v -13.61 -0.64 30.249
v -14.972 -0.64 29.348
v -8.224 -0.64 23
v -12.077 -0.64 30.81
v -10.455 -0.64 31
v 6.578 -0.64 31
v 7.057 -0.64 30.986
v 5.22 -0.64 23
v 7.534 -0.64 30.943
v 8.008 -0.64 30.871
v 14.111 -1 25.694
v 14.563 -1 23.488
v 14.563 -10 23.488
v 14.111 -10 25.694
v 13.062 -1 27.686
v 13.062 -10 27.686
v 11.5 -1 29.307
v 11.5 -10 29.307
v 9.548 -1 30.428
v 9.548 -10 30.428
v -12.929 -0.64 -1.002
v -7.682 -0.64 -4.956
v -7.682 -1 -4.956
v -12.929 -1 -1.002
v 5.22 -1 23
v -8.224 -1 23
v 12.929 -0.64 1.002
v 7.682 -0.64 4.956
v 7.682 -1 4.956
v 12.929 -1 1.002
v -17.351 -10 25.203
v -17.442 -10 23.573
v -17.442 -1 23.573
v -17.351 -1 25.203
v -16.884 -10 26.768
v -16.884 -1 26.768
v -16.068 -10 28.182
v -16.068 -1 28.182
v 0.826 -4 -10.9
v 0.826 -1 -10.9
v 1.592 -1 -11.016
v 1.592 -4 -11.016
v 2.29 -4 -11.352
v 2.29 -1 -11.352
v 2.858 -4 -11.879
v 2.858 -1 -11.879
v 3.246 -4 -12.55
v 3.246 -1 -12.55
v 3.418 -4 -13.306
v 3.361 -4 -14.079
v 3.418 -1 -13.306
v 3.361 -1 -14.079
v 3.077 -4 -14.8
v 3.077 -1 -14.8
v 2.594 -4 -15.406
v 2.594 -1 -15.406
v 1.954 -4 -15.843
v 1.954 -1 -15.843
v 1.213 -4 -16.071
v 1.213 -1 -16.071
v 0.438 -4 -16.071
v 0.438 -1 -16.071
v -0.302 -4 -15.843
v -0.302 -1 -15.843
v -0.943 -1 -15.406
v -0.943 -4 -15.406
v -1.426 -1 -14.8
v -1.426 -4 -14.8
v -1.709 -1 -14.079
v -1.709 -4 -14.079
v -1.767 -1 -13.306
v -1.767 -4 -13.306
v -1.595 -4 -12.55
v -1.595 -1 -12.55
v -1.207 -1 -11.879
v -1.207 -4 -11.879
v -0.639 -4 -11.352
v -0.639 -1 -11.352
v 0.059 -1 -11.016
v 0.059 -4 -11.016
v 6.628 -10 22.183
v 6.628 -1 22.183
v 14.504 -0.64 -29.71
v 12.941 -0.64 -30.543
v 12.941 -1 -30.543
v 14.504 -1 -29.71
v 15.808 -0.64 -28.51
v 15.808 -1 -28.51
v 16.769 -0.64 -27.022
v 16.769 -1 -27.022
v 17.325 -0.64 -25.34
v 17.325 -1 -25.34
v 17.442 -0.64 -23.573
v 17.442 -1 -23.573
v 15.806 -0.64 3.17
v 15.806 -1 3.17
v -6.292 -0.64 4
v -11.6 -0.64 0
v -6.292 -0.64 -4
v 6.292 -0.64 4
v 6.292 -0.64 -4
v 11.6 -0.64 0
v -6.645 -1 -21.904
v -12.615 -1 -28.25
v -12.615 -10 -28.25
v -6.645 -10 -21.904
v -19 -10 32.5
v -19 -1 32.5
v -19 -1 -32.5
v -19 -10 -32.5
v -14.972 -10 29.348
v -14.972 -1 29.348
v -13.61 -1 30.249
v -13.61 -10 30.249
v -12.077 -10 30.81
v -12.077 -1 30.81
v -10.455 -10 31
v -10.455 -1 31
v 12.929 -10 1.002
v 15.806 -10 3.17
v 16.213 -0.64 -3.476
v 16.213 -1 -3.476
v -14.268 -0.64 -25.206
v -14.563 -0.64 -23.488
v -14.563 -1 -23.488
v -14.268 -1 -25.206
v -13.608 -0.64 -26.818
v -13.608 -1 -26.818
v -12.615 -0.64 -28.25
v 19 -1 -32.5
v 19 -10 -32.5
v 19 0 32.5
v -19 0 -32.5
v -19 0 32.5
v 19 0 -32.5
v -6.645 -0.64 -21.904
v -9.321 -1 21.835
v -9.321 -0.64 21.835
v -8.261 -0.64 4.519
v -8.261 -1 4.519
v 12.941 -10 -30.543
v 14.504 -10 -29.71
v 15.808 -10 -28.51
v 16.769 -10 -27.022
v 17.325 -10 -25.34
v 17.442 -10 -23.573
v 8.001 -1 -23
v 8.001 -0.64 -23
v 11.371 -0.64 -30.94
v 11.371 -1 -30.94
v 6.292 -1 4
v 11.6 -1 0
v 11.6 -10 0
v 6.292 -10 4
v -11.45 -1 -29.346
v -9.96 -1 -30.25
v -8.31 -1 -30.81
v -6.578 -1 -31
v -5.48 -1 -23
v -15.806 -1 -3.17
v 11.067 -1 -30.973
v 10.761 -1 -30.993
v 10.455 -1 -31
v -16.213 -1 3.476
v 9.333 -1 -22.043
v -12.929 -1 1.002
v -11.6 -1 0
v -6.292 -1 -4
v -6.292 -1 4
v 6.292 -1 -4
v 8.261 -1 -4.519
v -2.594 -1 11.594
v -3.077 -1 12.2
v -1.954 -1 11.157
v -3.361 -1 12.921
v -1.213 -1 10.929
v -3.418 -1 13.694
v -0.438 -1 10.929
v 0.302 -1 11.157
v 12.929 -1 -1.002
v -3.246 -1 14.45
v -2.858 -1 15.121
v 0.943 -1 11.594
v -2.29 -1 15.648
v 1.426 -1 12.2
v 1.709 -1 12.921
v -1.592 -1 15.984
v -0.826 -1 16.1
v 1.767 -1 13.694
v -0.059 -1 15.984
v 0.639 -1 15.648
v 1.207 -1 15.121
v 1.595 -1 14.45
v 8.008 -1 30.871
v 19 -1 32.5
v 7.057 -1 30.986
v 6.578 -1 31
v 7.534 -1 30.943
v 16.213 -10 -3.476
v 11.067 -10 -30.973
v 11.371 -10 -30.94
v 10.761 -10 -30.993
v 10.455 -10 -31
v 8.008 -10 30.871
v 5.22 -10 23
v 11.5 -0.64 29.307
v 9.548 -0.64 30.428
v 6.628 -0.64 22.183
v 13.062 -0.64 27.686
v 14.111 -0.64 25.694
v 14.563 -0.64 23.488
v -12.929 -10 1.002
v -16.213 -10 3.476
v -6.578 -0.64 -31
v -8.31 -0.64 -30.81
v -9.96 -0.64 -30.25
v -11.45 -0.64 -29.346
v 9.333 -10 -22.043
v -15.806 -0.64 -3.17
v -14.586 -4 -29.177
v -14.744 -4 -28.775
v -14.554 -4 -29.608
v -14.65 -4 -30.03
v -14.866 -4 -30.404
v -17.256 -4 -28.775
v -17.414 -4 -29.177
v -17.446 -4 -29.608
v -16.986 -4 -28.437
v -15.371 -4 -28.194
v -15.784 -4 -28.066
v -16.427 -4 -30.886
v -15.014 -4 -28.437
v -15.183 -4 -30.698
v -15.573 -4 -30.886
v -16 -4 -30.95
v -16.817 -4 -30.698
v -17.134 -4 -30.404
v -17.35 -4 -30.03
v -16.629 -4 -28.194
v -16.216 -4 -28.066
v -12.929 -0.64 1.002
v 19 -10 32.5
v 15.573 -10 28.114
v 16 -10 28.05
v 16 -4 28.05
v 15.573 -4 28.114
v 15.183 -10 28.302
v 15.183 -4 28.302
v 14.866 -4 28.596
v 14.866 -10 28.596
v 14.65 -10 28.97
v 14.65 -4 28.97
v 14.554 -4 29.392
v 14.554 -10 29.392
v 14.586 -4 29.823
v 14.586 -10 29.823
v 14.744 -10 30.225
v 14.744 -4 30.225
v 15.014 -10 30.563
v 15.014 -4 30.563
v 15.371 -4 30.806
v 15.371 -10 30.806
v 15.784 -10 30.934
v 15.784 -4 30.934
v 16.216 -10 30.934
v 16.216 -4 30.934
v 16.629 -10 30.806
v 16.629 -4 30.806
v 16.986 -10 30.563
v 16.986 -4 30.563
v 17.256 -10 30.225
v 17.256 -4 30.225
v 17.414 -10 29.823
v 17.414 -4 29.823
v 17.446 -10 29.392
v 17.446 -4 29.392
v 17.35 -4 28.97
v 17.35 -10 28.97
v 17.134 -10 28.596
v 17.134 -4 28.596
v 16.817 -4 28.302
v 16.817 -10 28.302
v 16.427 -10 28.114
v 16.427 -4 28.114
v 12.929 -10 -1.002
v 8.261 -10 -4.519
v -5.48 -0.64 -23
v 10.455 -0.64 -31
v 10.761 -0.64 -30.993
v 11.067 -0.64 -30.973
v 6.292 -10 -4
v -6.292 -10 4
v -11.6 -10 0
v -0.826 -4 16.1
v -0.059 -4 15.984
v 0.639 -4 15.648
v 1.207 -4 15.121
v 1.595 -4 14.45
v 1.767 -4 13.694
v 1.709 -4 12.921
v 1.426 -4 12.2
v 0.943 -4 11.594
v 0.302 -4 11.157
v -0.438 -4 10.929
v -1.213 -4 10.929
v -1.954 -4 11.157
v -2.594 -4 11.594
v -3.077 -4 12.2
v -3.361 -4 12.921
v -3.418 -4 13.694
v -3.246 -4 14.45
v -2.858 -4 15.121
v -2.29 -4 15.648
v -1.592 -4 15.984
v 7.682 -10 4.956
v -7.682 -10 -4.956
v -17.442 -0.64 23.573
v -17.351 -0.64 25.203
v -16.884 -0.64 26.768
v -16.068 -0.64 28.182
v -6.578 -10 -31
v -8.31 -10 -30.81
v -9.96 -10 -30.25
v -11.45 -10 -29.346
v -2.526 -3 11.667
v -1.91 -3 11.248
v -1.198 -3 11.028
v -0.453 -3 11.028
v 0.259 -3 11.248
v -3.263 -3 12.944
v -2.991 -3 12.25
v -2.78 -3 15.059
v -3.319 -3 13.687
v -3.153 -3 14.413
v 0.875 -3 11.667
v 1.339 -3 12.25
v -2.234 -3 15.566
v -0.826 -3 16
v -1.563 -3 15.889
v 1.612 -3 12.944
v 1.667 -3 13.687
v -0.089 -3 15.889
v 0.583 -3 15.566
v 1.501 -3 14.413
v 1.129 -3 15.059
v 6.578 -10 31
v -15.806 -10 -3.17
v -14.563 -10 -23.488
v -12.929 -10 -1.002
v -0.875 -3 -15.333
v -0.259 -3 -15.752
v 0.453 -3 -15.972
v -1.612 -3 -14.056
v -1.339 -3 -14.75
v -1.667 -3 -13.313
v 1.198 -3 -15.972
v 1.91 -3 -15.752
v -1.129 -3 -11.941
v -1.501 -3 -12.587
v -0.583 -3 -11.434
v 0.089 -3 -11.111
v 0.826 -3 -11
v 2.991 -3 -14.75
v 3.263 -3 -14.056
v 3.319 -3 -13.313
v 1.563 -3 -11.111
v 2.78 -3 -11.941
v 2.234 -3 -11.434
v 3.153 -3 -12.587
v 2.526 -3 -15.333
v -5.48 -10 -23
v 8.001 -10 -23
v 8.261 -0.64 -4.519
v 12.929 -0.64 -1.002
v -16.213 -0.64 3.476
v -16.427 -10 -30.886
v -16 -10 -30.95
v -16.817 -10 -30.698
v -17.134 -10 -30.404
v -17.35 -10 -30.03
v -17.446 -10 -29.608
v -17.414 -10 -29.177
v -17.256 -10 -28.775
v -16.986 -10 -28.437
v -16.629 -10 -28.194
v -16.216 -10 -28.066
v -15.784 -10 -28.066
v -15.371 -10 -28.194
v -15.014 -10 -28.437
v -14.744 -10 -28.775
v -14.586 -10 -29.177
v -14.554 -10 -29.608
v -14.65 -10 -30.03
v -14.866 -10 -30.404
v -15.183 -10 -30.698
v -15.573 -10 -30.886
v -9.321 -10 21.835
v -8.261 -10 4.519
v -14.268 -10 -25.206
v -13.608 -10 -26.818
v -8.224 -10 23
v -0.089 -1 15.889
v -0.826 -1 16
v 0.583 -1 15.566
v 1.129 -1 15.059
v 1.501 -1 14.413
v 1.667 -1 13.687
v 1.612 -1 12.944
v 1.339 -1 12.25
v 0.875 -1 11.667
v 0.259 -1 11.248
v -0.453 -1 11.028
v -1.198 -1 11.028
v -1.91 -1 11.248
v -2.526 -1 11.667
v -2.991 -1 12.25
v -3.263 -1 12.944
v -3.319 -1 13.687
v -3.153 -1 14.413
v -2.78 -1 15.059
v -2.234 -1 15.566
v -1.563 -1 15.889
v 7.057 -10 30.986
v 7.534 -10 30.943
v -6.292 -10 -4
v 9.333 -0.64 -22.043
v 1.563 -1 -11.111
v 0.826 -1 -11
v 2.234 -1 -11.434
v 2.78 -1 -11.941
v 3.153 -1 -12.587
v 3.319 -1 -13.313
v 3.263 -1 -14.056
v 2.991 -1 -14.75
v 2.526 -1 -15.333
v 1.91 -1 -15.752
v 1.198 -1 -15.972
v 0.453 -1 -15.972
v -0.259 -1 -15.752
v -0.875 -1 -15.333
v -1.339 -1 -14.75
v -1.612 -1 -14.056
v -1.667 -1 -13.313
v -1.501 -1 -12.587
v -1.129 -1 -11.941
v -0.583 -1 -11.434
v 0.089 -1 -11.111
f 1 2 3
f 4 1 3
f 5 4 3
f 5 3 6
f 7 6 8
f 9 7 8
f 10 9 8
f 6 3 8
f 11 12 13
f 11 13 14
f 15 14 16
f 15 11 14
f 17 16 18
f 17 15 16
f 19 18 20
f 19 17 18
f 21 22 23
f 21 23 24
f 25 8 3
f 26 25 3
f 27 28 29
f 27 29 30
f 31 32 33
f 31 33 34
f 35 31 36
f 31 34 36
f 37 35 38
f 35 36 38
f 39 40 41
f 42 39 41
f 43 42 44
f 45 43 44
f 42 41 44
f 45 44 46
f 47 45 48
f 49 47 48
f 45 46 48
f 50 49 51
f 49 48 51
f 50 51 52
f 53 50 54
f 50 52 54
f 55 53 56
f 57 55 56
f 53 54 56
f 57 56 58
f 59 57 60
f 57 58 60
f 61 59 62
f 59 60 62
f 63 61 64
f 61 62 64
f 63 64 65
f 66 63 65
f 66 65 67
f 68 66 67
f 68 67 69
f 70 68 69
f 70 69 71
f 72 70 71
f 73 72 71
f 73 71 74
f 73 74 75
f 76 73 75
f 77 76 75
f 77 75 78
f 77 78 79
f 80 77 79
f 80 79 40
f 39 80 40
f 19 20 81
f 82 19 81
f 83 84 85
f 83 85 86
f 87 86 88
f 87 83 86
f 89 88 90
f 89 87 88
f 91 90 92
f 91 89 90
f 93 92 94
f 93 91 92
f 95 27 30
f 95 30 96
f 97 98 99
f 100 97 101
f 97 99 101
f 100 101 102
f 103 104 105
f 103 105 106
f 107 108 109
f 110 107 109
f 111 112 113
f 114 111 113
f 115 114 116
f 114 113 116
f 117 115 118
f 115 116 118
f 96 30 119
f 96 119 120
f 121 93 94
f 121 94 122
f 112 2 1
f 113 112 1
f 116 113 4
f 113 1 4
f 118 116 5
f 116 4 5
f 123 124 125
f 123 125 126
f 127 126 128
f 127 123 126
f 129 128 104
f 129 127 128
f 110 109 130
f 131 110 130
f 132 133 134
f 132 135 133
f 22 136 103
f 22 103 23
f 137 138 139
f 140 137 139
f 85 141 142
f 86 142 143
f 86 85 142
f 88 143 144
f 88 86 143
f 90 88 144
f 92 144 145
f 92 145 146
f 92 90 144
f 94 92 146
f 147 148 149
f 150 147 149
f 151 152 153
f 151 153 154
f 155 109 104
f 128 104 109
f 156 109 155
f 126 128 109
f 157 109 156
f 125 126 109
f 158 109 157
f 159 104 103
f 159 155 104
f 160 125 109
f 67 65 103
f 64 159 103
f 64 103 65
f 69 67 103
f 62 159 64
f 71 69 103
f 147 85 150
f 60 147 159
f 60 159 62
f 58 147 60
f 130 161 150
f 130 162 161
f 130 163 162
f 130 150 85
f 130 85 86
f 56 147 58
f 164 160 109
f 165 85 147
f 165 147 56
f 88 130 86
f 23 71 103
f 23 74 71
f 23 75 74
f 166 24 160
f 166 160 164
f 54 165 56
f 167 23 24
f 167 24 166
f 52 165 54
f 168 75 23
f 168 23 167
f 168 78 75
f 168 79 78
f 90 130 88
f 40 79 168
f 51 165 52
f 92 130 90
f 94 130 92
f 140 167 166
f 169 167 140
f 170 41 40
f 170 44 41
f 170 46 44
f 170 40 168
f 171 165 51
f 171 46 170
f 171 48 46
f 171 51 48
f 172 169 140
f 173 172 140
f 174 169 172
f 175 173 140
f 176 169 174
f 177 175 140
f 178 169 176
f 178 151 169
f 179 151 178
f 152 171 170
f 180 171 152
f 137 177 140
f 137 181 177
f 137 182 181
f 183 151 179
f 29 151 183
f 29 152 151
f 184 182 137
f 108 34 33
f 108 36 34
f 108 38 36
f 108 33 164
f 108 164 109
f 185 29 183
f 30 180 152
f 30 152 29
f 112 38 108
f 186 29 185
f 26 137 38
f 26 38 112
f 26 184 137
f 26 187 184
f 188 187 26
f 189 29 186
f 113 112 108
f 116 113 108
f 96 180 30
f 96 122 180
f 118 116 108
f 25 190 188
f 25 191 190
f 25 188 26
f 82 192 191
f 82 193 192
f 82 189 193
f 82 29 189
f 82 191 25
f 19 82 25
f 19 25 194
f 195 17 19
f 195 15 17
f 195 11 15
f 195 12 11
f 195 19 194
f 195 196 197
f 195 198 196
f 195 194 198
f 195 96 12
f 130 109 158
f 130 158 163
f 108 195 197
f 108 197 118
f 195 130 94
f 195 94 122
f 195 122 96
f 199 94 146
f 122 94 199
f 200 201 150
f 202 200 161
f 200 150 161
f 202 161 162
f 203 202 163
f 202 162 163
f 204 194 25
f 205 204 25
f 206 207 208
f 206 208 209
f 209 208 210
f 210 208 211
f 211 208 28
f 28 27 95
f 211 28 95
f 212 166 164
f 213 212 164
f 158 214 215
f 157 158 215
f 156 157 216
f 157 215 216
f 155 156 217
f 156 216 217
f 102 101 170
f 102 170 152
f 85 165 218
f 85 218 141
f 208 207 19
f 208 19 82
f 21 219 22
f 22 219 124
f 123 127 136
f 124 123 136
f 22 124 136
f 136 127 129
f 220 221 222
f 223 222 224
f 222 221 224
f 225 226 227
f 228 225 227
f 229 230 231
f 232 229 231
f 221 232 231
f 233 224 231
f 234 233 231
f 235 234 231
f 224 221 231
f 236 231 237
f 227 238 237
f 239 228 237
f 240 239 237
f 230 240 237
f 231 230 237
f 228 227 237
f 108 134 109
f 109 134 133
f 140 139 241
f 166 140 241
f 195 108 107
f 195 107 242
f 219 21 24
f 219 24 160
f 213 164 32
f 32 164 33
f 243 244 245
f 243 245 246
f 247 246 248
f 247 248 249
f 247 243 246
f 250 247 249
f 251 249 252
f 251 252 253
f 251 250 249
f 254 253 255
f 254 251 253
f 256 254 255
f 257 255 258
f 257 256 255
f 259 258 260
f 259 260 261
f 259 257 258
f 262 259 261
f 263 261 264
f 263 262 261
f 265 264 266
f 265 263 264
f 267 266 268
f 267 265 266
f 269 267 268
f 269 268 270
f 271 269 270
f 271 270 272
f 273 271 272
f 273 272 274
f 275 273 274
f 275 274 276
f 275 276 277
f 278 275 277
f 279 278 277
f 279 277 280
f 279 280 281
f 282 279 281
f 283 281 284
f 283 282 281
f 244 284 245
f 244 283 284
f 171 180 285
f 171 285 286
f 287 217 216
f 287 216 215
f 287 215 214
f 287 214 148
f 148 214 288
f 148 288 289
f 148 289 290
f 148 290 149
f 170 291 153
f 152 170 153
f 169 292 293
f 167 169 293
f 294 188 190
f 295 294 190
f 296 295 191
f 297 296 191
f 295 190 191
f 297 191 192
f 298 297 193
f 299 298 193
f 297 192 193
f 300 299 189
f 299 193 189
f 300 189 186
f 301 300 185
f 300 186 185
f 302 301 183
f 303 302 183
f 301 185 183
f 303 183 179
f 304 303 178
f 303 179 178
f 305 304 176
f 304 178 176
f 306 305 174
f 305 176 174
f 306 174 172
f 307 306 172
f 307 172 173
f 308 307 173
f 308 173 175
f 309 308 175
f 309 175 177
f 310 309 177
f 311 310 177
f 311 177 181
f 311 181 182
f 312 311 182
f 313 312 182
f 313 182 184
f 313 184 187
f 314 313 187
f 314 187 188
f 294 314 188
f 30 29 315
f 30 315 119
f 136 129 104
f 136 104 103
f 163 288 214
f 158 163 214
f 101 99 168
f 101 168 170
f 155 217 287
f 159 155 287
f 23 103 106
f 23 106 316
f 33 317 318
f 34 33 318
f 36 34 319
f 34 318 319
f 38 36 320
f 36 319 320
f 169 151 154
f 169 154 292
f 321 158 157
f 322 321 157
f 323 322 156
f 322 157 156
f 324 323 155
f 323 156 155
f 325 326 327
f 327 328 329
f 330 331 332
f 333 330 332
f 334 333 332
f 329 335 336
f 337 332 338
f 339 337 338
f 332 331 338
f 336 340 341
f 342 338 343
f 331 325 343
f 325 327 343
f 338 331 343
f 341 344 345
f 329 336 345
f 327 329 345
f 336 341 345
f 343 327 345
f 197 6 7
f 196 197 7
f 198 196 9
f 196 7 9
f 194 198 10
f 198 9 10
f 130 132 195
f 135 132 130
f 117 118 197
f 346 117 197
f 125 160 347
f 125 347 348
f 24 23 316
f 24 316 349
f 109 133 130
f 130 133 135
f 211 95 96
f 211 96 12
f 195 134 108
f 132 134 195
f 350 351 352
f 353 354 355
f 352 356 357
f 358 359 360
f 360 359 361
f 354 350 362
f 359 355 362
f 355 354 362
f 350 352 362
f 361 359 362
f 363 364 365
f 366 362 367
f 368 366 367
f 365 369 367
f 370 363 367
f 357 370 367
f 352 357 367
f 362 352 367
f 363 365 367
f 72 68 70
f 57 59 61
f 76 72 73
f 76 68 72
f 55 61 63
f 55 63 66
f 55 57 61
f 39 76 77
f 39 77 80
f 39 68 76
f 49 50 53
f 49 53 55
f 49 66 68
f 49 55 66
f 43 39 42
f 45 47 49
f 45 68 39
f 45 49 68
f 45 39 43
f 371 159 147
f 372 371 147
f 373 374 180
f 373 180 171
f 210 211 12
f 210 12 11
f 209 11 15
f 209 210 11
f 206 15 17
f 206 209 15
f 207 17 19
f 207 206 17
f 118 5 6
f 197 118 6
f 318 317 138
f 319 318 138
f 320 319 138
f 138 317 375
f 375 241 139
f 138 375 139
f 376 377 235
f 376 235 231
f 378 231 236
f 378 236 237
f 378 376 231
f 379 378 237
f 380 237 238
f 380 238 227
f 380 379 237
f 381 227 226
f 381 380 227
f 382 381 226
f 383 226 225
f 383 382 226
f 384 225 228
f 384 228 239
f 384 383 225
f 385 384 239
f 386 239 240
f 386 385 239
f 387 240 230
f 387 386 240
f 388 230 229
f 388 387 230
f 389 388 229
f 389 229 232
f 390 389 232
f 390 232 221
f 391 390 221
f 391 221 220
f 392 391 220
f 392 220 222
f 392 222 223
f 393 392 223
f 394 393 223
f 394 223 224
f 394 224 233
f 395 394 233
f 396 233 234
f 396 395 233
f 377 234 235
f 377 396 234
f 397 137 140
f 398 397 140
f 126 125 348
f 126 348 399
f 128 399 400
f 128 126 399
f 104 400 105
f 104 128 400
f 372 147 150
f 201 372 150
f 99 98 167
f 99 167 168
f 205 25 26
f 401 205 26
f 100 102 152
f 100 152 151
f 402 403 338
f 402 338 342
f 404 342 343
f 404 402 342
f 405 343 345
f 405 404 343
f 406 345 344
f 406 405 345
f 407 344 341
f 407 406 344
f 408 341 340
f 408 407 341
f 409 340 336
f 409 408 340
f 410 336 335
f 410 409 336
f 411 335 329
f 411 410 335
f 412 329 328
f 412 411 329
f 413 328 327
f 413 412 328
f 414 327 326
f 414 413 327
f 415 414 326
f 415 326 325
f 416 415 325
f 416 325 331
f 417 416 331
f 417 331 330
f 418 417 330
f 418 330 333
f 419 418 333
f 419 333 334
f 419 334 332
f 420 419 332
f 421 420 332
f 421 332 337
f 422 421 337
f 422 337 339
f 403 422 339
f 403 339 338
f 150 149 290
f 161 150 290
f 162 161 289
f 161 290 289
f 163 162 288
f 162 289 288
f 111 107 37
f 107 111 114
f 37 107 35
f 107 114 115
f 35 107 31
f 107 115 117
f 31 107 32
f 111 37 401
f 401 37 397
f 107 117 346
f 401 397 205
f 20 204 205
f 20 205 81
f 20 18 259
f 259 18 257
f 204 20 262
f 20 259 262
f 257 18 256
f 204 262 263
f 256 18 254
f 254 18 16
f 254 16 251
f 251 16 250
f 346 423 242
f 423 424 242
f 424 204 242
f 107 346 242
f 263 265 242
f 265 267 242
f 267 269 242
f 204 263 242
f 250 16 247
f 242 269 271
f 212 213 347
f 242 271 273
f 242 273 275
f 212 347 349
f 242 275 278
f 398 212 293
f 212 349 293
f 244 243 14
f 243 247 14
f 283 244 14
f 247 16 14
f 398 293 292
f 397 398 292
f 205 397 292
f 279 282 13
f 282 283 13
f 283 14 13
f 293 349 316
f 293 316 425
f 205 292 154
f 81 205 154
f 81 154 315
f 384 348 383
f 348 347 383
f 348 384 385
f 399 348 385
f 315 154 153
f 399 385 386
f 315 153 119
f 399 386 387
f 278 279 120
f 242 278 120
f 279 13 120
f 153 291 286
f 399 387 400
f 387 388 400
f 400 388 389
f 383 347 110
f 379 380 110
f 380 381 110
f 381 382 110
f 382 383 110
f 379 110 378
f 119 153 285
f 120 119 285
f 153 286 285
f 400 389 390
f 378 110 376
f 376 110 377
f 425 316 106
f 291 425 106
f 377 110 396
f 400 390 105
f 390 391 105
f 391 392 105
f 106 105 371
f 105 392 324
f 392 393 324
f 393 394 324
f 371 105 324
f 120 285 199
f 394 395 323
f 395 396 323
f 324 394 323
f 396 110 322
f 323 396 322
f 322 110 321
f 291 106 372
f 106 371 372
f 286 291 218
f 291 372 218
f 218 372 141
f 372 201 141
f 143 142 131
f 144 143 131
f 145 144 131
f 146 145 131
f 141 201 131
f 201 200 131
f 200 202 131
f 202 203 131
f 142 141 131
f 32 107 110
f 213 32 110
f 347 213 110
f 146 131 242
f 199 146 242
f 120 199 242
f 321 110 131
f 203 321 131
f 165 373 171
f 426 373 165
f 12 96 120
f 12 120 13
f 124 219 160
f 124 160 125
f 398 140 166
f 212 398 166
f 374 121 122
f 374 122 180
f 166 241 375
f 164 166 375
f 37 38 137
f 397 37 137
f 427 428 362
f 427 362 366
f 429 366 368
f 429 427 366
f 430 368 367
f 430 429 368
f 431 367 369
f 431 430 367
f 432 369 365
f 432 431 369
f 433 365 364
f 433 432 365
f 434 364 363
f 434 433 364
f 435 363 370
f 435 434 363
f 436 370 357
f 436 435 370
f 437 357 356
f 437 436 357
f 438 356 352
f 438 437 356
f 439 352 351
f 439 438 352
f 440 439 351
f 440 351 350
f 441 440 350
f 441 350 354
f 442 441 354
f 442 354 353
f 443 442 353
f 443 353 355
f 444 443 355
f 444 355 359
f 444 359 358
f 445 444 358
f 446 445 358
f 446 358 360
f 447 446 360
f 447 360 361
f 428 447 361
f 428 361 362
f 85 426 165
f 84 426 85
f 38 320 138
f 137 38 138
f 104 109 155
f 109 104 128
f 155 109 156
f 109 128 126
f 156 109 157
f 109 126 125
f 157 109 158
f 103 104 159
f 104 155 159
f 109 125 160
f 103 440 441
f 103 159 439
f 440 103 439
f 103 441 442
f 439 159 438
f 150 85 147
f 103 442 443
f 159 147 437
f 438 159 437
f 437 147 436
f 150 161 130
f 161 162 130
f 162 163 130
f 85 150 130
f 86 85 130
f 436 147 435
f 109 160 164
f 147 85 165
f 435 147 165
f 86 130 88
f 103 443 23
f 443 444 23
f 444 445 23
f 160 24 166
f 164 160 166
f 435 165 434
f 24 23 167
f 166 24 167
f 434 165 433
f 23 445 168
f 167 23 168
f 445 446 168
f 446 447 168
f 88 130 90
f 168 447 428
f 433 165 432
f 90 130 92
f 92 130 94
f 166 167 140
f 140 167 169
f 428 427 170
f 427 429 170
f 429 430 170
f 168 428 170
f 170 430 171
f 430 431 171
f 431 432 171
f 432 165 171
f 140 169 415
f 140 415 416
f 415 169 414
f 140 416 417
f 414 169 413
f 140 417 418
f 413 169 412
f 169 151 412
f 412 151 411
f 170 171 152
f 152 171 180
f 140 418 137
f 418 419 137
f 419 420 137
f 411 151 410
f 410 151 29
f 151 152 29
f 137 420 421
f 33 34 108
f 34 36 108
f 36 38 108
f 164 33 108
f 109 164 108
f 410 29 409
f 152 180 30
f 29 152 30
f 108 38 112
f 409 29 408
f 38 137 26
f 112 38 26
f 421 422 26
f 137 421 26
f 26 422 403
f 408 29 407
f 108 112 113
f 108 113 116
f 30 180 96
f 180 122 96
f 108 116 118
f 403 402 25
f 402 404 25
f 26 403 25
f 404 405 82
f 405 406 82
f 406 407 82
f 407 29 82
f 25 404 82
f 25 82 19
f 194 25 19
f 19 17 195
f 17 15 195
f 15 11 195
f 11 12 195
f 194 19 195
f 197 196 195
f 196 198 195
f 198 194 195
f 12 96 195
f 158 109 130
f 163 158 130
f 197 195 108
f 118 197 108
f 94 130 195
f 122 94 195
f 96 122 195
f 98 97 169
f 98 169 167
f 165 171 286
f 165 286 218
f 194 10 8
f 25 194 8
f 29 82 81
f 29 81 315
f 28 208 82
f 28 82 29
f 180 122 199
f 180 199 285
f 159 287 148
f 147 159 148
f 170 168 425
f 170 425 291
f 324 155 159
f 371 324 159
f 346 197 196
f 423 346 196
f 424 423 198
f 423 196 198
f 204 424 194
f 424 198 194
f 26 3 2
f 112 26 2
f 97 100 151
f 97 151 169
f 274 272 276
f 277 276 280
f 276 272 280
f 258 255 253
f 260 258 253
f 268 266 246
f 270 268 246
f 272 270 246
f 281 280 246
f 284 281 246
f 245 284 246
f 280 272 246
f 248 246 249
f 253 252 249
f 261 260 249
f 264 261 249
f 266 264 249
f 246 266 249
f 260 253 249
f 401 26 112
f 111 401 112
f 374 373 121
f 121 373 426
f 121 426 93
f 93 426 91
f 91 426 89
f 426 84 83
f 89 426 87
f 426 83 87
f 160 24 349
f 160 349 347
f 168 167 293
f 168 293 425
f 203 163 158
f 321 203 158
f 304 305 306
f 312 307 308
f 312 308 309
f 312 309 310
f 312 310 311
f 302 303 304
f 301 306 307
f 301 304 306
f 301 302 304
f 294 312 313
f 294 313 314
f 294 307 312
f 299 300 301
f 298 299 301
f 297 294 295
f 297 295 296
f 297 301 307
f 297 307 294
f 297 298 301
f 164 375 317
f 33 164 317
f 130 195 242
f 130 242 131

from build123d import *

# Parameters (mm, degrees)
SKETCH3_W           = 38
SKETCH3_H           = 65
BOSS_EXTRUDE1_DEPTH = 0.64
SKETCH3_3_W         = 38
SKETCH3_3_H         = 65
BOSS_EXTRUDE2_DEPTH = 10
SKETCH6_R           = 2.5
BOSS_EXTRUDE3_DEPTH = 3
SKETCH6_3_R         = 2.6
SKETCH6_3_R_2       = 2.5
CUT_EXTRUDE2_DEPTH  = 4
CUT_EXTRUDE1_START  = -10
SKETCH5_R           = 1.45
CUT_EXTRUDE1_DEPTH  = 6


with BuildPart() as part:
    # Sketch3 → Boss-Extrude1 (new body)
    with BuildSketch(Plane(origin=(0, 0, 0), x_dir=(1, 0, 0), z_dir=(0, 1, 0))):
        Rectangle(SKETCH3_W, SKETCH3_H)
    extrude(amount=-BOSS_EXTRUDE1_DEPTH)

    # Sketch3<3> → Boss-Extrude2 (add)
    with BuildSketch(Plane(origin=(0, 0, 0), x_dir=(1, 0, 0), z_dir=(0, 1, 0))):
        Rectangle(SKETCH3_3_W, SKETCH3_3_H)
        with BuildLine():
            Line((-15.806141704, 3.169555117), (-14.563388627, 23.488388316))
            ThreePointArc((-14.563388627, 23.488388316), (-13.982347964, 26.029888674), (-12.614994756, 28.249613324))
            Line((-12.614994756, 28.249613324), (-6.645362379, 21.903707215))
            Line((-6.645362379, 21.903707215), (-7.681935248, 4.955890615))
            Line((-7.681935248, 4.955890615), (-12.929312113, 1.001708527))
            Line((-12.929312113, 1.001708527), (-15.806141704, 3.169555117))
        make_face(mode=Mode.SUBTRACT)
        with BuildLine():
            Line((-11.449601204, 29.345906109), (-5.479968827, 23))
            Line((-5.479968827, 23), (8.001249484, 23))
            Line((8.001249484, 23), (11.371462409, 30.939724094))
            ThreePointArc((11.371462409, 30.939724094), (10.91413207, 30.984914769), (10.454822074, 31))
            Line((10.454822074, 31), (-6.57831024, 31))
            ThreePointArc((-6.57831024, 31), (-9.150541871, 30.57519798), (-11.449601204, 29.345906109))
        make_face(mode=Mode.SUBTRACT)
        Polygon((-11.6, 0), (-6.291820714, 4), (6.291820714, 4), (11.6, 0), (6.291820714, -4), (-6.291820714, -4), align=None, mode=Mode.SUBTRACT)
        with BuildLine():
            Line((9.333267306, 22.043149873), (12.941431756, 30.543452628))
            ThreePointArc((12.941431756, 30.543452628), (16.335726731, 27.796703889), (17.441765663, 23.572660223))
            Line((17.441765663, 23.572660223), (16.212591289, 3.475836847))
            Line((16.212591289, 3.475836847), (12.929312113, 1.001708527))
            Line((12.929312113, 1.001708527), (8.261456028, 4.519190384))
            Line((8.261456028, 4.519190384), (9.333267306, 22.043149873))
        make_face(mode=Mode.SUBTRACT)
        with BuildLine():
            Line((6.62830762, -22.182550065), (7.681935248, -4.955890615))
            Line((7.681935248, -4.955890615), (12.929312113, -1.001708527))
            Line((12.929312113, -1.001708527), (15.806141704, -3.169555117))
            Line((15.806141704, -3.169555117), (14.563388627, -23.488388316))
            ThreePointArc((14.563388627, -23.488388316), (13.062425539, -27.685749543), (9.548273172, -30.428278413))
            Line((9.548273172, -30.428278413), (6.62830762, -22.182550065))
        make_face(mode=Mode.SUBTRACT)
        with BuildLine():
            Line((8.007780574, -30.871252414), (5.220423905, -23))
            Line((5.220423905, -23), (-8.224219459, -23))
            Line((-8.224219459, -23), (-14.971866072, -29.347552106))
            ThreePointArc((-14.971866072, -29.347552106), (-12.859726985, -30.573920624), (-10.454822074, -31))
            Line((-10.454822074, -31), (6.57831024, -31))
            ThreePointArc((6.57831024, -31), (7.295938517, -30.967748092), (8.007780574, -30.871252414))
        make_face(mode=Mode.SUBTRACT)
        with BuildLine():
            Line((-16.068158856, -28.182158554), (-9.320512244, -21.834606448))
            Line((-9.320512244, -21.834606448), (-8.261456028, -4.519190384))
            Line((-8.261456028, -4.519190384), (-12.929312113, -1.001708527))
            Line((-12.929312113, -1.001708527), (-16.212591289, -3.475836847))
            Line((-16.212591289, -3.475836847), (-17.441765663, -23.572660223))
            ThreePointArc((-17.441765663, -23.572660223), (-17.163296944, -25.999091025), (-16.068158856, -28.182158554))
        make_face(mode=Mode.SUBTRACT)
    extrude(amount=-BOSS_EXTRUDE2_DEPTH)


with BuildPart() as body_2:
    # Split1: the piece on the far side of the plane
    add(part.part)
    split(bisect_by=Plane.ZX.offset(-1), keep=Keep.BOTTOM)

    # Sketch6<3> → Cut-Extrude2 (cut)
    # profile 1 of 4: a face of its own
    with BuildSketch(Plane(origin=(0, 0, 0), x_dir=(1, 0, 0), z_dir=(0, 1, 0))):
        with Locations(Location((0.825695372, 13.5, 0), (0, 0, 270))):
            Circle(SKETCH6_3_R)
        with Locations(Location((0.825695372, 13.5, 0), (0, 0, 270))):
            Circle(SKETCH6_3_R_2, mode=Mode.SUBTRACT)
    # profile 2 of 4: a face of its own
    with BuildSketch(Plane(origin=(0, 0, 0), x_dir=(1, 0, 0), z_dir=(0, 1, 0))):
        with Locations(Location((0.825695372, 13.5, 0), (0, 0, 270))):
            Circle(SKETCH6_3_R_2)
    # profile 3 of 4: a face of its own
    with BuildSketch(Plane(origin=(0, 0, 0), x_dir=(1, 0, 0), z_dir=(0, 1, 0))):
        with Locations(Location((-0.825695372, -13.5, 0), (0, 0, 270))):
            Circle(SKETCH6_3_R)
        with Locations(Location((-0.825695372, -13.5, 0), (0, 0, 270))):
            Circle(SKETCH6_3_R_2, mode=Mode.SUBTRACT)
    # profile 4 of 4: a face of its own
    with BuildSketch(Plane(origin=(0, 0, 0), x_dir=(1, 0, 0), z_dir=(0, 1, 0))):
        with Locations(Location((-0.825695372, -13.5, 0), (0, 0, 270))):
            Circle(SKETCH6_3_R_2)
    extrude(amount=-CUT_EXTRUDE2_DEPTH, mode=Mode.SUBTRACT)

    # Sketch5 → Cut-Extrude1 (cut)
    with BuildSketch(Plane(origin=(0, 0, 0), x_dir=(1, 0, 0), z_dir=(0, 1, 0)).offset(CUT_EXTRUDE1_START)):
        with Locations(Location((-16, 29.5, 0), (0, 0, 90))):
            Circle(SKETCH5_R)
        with Locations(Location((16, -29.5, 0), (0, 0, 90))):
            Circle(SKETCH5_R)
    extrude(amount=CUT_EXTRUDE1_DEPTH, mode=Mode.SUBTRACT)


with BuildPart() as part_1:
    add(part.part)

    # Split1
    split(bisect_by=Plane.ZX.offset(-1), keep=Keep.TOP)

    # Sketch6 → Boss-Extrude3 (add)
    with BuildSketch(Plane(origin=(0, 0, 0), x_dir=(1, 0, 0), z_dir=(0, 1, 0))):
        with Locations(Location((0.825695372, 13.5, 0), (0, 0, 270))):
            Circle(SKETCH6_R)
        with Locations(Location((-0.825695372, -13.5, 0), (0, 0, 270))):
            Circle(SKETCH6_R)
    extrude(amount=-BOSS_EXTRUDE3_DEPTH)


solid = Compound([body_2.part, part_1.part])
